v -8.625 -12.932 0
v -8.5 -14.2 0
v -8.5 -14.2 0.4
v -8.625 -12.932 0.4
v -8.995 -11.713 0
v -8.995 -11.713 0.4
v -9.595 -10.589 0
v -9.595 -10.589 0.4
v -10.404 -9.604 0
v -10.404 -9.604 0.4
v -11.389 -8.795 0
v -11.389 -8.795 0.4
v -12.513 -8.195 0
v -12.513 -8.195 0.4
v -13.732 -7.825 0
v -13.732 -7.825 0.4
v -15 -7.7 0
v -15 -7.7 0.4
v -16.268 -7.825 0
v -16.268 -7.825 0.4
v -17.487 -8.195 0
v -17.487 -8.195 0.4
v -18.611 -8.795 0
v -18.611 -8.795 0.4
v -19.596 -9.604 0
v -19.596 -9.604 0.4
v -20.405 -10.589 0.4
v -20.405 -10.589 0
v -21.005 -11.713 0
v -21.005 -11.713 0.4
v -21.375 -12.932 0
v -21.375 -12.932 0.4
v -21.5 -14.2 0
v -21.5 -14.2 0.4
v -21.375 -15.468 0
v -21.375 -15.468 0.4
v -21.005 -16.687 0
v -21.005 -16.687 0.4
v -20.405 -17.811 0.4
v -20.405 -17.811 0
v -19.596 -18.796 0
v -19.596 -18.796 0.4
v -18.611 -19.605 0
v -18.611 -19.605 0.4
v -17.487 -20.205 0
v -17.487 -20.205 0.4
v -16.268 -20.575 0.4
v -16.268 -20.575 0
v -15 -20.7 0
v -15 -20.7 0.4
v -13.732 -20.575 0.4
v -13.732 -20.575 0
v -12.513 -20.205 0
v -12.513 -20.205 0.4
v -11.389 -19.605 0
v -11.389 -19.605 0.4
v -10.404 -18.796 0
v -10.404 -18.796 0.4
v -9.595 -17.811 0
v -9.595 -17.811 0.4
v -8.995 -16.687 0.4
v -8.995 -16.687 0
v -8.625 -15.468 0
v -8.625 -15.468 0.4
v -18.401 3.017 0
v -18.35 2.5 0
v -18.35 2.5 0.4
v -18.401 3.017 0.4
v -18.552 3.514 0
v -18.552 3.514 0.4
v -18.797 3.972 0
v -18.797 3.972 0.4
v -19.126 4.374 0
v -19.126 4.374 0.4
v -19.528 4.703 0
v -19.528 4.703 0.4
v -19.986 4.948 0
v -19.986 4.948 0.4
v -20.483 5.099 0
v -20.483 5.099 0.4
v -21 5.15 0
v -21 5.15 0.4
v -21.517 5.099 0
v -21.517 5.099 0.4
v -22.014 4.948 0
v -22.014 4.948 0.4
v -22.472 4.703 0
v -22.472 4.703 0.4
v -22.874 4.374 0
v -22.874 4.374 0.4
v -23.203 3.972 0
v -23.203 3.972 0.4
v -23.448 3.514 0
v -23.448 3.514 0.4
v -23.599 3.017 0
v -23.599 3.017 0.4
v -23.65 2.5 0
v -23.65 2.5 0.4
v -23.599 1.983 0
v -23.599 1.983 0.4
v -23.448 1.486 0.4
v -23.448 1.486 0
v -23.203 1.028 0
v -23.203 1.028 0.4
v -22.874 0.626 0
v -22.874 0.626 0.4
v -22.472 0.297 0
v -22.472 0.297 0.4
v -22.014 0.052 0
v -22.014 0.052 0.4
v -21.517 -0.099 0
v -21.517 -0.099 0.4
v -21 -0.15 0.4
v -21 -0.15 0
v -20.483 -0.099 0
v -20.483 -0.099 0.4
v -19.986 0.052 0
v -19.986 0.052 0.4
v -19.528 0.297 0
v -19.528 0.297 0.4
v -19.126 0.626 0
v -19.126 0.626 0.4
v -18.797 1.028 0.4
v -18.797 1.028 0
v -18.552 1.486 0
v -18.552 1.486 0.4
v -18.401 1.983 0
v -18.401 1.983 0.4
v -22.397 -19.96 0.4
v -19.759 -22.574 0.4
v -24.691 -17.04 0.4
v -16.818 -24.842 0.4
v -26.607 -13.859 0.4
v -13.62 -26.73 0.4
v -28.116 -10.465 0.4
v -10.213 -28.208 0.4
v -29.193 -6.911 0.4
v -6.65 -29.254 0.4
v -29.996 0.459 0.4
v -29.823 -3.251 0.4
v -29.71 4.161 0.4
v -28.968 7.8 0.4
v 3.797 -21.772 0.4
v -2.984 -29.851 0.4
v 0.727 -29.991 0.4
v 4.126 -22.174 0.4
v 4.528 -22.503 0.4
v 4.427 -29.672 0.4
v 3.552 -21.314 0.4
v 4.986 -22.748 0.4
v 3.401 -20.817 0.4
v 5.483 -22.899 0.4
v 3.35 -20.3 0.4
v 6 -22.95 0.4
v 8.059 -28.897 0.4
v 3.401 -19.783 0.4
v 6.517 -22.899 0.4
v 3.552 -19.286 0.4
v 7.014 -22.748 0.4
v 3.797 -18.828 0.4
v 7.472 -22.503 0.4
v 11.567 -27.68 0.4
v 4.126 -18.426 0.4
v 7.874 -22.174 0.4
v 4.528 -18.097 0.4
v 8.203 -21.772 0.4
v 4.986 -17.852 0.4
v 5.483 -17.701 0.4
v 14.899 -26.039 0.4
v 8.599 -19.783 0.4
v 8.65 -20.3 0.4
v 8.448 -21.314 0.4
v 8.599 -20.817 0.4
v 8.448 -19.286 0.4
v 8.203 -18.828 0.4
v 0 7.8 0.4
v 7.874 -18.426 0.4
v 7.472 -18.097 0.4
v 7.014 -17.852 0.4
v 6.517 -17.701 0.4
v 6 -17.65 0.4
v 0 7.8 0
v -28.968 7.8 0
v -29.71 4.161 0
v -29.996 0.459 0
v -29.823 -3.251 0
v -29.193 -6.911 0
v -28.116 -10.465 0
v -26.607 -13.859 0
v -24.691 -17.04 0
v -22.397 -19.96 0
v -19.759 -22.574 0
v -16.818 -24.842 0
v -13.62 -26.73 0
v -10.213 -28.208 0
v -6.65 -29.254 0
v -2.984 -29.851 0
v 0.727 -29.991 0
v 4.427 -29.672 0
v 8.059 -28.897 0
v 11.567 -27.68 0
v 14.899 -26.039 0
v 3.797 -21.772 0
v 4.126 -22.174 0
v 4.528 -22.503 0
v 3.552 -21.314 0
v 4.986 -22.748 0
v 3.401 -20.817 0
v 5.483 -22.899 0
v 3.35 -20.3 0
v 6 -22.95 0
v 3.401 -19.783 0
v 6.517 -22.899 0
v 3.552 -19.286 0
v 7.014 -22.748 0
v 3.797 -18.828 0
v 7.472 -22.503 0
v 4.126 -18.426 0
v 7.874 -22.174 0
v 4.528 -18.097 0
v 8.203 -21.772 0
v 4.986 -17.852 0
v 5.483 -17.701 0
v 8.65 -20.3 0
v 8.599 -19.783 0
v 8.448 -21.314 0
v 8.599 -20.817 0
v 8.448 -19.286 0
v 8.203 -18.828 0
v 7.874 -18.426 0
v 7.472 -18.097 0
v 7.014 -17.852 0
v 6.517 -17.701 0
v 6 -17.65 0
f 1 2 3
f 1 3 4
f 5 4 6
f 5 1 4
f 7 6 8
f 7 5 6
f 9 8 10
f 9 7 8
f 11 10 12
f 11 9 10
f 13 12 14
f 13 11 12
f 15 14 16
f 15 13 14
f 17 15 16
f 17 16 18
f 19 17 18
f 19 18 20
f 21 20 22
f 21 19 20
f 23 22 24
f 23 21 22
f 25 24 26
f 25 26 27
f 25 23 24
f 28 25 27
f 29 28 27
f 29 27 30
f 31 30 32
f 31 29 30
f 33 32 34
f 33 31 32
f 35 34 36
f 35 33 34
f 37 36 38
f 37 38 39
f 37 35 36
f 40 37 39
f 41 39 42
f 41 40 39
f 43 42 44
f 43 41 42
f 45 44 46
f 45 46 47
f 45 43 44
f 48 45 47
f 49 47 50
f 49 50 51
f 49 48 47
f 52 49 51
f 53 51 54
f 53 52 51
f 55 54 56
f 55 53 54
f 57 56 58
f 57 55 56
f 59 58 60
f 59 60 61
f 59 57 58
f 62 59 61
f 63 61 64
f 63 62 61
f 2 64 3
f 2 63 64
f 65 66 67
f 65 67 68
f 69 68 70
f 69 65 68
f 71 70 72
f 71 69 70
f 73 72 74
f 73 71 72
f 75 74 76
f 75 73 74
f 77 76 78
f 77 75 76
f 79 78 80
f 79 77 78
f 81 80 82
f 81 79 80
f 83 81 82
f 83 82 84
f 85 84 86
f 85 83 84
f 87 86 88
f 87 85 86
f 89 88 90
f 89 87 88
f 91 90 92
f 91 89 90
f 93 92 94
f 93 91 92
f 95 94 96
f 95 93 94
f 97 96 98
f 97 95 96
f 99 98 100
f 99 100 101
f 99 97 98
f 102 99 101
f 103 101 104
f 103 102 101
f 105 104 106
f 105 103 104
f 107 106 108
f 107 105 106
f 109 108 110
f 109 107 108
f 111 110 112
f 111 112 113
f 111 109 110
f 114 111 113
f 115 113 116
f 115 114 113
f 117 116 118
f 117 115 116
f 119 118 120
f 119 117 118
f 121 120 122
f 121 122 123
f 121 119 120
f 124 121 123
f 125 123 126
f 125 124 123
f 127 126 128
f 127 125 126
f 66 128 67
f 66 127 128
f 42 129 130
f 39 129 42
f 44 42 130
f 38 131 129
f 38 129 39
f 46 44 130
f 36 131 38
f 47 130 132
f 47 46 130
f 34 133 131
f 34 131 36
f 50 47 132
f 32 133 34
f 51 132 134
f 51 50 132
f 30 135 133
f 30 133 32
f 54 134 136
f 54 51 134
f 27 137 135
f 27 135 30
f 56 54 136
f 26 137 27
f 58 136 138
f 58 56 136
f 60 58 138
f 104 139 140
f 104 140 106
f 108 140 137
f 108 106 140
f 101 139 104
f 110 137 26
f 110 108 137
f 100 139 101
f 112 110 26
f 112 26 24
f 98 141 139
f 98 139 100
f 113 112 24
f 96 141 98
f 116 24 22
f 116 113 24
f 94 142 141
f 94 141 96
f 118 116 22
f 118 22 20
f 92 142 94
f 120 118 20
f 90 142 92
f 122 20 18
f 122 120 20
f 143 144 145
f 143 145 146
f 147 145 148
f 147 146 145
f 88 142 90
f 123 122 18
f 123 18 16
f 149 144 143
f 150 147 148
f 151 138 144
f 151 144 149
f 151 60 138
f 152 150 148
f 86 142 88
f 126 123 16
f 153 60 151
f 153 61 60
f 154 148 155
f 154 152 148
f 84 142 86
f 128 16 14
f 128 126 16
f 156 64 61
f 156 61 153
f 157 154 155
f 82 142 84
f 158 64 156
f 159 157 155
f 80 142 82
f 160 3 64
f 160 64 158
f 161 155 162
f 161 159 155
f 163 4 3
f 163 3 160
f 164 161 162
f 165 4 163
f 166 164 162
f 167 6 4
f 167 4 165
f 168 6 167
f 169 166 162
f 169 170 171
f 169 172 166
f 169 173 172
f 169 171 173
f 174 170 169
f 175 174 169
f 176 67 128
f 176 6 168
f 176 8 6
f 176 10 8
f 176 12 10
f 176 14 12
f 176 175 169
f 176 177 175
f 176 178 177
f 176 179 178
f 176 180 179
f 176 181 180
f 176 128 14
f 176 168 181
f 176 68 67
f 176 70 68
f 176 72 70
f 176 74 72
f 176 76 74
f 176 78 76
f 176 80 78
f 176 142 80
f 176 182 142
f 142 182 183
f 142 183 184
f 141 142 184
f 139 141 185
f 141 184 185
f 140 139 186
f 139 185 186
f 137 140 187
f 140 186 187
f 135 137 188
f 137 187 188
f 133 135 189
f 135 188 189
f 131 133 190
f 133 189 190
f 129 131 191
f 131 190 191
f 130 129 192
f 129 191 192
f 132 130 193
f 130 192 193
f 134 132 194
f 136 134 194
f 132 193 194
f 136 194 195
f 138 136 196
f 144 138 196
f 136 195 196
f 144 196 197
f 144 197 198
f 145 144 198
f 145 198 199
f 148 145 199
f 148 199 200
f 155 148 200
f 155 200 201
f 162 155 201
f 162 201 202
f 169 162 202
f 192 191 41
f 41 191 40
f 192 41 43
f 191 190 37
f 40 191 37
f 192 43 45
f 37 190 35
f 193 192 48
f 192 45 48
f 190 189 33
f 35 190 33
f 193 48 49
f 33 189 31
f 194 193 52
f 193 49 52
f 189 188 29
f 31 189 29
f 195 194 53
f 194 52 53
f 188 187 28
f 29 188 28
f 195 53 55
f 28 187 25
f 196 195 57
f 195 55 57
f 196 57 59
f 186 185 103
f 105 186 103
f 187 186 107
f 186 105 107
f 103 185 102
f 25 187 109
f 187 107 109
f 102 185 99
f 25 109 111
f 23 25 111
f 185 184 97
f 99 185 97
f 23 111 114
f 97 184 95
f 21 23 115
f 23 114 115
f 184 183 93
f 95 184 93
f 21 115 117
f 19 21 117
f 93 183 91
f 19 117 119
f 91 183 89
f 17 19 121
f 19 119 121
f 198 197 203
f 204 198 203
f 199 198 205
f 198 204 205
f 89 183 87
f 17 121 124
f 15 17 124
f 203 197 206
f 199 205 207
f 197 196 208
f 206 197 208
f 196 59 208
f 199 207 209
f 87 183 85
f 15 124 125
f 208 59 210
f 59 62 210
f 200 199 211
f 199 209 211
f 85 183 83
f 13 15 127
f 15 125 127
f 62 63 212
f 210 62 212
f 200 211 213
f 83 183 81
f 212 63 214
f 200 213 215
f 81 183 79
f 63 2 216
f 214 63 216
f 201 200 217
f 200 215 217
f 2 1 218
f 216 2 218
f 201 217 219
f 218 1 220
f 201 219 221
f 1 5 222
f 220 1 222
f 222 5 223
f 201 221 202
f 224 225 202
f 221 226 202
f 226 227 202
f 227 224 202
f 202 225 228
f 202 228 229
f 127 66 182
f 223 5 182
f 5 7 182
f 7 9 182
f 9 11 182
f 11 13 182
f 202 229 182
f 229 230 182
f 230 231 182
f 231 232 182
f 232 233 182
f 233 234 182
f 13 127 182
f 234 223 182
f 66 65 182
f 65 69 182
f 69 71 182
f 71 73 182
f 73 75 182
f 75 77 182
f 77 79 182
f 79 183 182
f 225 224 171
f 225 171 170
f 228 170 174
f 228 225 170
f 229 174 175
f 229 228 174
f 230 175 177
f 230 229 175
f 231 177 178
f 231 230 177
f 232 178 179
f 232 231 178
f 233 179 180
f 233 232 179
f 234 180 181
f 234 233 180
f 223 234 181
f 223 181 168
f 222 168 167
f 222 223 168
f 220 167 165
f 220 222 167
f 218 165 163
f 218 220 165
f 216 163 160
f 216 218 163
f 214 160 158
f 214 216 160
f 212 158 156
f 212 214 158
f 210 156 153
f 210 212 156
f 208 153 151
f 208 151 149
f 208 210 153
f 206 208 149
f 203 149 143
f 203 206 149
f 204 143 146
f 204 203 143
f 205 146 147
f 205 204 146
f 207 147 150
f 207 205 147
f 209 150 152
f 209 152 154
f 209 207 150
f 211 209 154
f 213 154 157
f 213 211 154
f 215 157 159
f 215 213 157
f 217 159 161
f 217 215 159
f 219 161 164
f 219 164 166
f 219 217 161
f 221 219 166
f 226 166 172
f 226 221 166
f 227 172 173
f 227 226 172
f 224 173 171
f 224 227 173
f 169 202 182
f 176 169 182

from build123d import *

# Parameters (mm, degrees)
F0_R     = 6.5
F0_R_2   = 2.65
F1_DEPTH = 0.4


with BuildPart() as f1:
    # F0 (on Top) → F1 (new body)
    with BuildSketch(Plane.XY):
        with BuildLine():
            Line((0, 7.800064), (-28.968241, 7.800064))
            ThreePointArc((-28.968241, 7.800064), (-18.323754, -23.753738), (14.898601, -26.039041))
            Line((14.898601, -26.039041), (0, 7.800064))
        make_face()
        with Locations((-15, -14.2)):
            Circle(F0_R, mode=Mode.SUBTRACT)
        with Locations((6, -20.3)):
            Circle(F0_R_2, mode=Mode.SUBTRACT)
        with Locations((-21, 2.5)):
            Circle(F0_R_2, mode=Mode.SUBTRACT)
    extrude(amount=F1_DEPTH)


solid = f1.part
